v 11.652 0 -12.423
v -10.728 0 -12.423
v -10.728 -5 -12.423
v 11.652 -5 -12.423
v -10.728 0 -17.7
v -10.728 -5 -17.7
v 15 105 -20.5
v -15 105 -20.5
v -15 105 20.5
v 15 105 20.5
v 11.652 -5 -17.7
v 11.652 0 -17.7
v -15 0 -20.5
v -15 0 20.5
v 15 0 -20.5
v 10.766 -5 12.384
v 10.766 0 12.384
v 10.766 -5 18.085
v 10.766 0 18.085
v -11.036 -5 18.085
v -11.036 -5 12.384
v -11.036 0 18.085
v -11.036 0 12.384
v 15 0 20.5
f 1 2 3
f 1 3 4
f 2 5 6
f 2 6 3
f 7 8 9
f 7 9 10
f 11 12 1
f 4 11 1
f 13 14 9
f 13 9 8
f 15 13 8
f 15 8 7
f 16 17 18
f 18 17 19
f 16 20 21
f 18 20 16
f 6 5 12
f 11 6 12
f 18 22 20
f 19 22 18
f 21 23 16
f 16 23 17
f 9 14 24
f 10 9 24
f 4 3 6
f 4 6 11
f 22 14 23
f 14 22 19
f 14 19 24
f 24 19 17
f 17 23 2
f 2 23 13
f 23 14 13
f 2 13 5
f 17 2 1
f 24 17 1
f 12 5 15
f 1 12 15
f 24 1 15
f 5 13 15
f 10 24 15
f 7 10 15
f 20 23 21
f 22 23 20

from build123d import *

# Parameters (mm, degrees)
SKETCH1_W           = 30
SKETCH1_H           = 41
BOSS_EXTRUDE1_DEPTH = 105
SKETCH2_W           = 21.801991159
SKETCH2_H           = 5.700874013
SKETCH2_W_2         = 22.379782444
SKETCH2_H_2         = 5.277160404
BOSS_EXTRUDE2_DEPTH = 5


with BuildPart() as part:
    # Sketch1 → Boss-Extrude1 (new body)
    with BuildSketch(Plane(origin=(0, 0, 0), x_dir=(1, 0, 0), z_dir=(0, 1, 0))):
        Rectangle(SKETCH1_W, SKETCH1_H)
    extrude(amount=BOSS_EXTRUDE1_DEPTH)

    # Sketch2 → Boss-Extrude2 (add)
    with BuildSketch(Plane.XZ):
        with Locations((-0.134817966, 15.234430217)):
            Rectangle(SKETCH2_W, SKETCH2_H)
        with Locations((0.462233028, -15.061092832)):
            Rectangle(SKETCH2_W_2, SKETCH2_H_2)
    extrude(amount=BOSS_EXTRUDE2_DEPTH)


solid = part.part
